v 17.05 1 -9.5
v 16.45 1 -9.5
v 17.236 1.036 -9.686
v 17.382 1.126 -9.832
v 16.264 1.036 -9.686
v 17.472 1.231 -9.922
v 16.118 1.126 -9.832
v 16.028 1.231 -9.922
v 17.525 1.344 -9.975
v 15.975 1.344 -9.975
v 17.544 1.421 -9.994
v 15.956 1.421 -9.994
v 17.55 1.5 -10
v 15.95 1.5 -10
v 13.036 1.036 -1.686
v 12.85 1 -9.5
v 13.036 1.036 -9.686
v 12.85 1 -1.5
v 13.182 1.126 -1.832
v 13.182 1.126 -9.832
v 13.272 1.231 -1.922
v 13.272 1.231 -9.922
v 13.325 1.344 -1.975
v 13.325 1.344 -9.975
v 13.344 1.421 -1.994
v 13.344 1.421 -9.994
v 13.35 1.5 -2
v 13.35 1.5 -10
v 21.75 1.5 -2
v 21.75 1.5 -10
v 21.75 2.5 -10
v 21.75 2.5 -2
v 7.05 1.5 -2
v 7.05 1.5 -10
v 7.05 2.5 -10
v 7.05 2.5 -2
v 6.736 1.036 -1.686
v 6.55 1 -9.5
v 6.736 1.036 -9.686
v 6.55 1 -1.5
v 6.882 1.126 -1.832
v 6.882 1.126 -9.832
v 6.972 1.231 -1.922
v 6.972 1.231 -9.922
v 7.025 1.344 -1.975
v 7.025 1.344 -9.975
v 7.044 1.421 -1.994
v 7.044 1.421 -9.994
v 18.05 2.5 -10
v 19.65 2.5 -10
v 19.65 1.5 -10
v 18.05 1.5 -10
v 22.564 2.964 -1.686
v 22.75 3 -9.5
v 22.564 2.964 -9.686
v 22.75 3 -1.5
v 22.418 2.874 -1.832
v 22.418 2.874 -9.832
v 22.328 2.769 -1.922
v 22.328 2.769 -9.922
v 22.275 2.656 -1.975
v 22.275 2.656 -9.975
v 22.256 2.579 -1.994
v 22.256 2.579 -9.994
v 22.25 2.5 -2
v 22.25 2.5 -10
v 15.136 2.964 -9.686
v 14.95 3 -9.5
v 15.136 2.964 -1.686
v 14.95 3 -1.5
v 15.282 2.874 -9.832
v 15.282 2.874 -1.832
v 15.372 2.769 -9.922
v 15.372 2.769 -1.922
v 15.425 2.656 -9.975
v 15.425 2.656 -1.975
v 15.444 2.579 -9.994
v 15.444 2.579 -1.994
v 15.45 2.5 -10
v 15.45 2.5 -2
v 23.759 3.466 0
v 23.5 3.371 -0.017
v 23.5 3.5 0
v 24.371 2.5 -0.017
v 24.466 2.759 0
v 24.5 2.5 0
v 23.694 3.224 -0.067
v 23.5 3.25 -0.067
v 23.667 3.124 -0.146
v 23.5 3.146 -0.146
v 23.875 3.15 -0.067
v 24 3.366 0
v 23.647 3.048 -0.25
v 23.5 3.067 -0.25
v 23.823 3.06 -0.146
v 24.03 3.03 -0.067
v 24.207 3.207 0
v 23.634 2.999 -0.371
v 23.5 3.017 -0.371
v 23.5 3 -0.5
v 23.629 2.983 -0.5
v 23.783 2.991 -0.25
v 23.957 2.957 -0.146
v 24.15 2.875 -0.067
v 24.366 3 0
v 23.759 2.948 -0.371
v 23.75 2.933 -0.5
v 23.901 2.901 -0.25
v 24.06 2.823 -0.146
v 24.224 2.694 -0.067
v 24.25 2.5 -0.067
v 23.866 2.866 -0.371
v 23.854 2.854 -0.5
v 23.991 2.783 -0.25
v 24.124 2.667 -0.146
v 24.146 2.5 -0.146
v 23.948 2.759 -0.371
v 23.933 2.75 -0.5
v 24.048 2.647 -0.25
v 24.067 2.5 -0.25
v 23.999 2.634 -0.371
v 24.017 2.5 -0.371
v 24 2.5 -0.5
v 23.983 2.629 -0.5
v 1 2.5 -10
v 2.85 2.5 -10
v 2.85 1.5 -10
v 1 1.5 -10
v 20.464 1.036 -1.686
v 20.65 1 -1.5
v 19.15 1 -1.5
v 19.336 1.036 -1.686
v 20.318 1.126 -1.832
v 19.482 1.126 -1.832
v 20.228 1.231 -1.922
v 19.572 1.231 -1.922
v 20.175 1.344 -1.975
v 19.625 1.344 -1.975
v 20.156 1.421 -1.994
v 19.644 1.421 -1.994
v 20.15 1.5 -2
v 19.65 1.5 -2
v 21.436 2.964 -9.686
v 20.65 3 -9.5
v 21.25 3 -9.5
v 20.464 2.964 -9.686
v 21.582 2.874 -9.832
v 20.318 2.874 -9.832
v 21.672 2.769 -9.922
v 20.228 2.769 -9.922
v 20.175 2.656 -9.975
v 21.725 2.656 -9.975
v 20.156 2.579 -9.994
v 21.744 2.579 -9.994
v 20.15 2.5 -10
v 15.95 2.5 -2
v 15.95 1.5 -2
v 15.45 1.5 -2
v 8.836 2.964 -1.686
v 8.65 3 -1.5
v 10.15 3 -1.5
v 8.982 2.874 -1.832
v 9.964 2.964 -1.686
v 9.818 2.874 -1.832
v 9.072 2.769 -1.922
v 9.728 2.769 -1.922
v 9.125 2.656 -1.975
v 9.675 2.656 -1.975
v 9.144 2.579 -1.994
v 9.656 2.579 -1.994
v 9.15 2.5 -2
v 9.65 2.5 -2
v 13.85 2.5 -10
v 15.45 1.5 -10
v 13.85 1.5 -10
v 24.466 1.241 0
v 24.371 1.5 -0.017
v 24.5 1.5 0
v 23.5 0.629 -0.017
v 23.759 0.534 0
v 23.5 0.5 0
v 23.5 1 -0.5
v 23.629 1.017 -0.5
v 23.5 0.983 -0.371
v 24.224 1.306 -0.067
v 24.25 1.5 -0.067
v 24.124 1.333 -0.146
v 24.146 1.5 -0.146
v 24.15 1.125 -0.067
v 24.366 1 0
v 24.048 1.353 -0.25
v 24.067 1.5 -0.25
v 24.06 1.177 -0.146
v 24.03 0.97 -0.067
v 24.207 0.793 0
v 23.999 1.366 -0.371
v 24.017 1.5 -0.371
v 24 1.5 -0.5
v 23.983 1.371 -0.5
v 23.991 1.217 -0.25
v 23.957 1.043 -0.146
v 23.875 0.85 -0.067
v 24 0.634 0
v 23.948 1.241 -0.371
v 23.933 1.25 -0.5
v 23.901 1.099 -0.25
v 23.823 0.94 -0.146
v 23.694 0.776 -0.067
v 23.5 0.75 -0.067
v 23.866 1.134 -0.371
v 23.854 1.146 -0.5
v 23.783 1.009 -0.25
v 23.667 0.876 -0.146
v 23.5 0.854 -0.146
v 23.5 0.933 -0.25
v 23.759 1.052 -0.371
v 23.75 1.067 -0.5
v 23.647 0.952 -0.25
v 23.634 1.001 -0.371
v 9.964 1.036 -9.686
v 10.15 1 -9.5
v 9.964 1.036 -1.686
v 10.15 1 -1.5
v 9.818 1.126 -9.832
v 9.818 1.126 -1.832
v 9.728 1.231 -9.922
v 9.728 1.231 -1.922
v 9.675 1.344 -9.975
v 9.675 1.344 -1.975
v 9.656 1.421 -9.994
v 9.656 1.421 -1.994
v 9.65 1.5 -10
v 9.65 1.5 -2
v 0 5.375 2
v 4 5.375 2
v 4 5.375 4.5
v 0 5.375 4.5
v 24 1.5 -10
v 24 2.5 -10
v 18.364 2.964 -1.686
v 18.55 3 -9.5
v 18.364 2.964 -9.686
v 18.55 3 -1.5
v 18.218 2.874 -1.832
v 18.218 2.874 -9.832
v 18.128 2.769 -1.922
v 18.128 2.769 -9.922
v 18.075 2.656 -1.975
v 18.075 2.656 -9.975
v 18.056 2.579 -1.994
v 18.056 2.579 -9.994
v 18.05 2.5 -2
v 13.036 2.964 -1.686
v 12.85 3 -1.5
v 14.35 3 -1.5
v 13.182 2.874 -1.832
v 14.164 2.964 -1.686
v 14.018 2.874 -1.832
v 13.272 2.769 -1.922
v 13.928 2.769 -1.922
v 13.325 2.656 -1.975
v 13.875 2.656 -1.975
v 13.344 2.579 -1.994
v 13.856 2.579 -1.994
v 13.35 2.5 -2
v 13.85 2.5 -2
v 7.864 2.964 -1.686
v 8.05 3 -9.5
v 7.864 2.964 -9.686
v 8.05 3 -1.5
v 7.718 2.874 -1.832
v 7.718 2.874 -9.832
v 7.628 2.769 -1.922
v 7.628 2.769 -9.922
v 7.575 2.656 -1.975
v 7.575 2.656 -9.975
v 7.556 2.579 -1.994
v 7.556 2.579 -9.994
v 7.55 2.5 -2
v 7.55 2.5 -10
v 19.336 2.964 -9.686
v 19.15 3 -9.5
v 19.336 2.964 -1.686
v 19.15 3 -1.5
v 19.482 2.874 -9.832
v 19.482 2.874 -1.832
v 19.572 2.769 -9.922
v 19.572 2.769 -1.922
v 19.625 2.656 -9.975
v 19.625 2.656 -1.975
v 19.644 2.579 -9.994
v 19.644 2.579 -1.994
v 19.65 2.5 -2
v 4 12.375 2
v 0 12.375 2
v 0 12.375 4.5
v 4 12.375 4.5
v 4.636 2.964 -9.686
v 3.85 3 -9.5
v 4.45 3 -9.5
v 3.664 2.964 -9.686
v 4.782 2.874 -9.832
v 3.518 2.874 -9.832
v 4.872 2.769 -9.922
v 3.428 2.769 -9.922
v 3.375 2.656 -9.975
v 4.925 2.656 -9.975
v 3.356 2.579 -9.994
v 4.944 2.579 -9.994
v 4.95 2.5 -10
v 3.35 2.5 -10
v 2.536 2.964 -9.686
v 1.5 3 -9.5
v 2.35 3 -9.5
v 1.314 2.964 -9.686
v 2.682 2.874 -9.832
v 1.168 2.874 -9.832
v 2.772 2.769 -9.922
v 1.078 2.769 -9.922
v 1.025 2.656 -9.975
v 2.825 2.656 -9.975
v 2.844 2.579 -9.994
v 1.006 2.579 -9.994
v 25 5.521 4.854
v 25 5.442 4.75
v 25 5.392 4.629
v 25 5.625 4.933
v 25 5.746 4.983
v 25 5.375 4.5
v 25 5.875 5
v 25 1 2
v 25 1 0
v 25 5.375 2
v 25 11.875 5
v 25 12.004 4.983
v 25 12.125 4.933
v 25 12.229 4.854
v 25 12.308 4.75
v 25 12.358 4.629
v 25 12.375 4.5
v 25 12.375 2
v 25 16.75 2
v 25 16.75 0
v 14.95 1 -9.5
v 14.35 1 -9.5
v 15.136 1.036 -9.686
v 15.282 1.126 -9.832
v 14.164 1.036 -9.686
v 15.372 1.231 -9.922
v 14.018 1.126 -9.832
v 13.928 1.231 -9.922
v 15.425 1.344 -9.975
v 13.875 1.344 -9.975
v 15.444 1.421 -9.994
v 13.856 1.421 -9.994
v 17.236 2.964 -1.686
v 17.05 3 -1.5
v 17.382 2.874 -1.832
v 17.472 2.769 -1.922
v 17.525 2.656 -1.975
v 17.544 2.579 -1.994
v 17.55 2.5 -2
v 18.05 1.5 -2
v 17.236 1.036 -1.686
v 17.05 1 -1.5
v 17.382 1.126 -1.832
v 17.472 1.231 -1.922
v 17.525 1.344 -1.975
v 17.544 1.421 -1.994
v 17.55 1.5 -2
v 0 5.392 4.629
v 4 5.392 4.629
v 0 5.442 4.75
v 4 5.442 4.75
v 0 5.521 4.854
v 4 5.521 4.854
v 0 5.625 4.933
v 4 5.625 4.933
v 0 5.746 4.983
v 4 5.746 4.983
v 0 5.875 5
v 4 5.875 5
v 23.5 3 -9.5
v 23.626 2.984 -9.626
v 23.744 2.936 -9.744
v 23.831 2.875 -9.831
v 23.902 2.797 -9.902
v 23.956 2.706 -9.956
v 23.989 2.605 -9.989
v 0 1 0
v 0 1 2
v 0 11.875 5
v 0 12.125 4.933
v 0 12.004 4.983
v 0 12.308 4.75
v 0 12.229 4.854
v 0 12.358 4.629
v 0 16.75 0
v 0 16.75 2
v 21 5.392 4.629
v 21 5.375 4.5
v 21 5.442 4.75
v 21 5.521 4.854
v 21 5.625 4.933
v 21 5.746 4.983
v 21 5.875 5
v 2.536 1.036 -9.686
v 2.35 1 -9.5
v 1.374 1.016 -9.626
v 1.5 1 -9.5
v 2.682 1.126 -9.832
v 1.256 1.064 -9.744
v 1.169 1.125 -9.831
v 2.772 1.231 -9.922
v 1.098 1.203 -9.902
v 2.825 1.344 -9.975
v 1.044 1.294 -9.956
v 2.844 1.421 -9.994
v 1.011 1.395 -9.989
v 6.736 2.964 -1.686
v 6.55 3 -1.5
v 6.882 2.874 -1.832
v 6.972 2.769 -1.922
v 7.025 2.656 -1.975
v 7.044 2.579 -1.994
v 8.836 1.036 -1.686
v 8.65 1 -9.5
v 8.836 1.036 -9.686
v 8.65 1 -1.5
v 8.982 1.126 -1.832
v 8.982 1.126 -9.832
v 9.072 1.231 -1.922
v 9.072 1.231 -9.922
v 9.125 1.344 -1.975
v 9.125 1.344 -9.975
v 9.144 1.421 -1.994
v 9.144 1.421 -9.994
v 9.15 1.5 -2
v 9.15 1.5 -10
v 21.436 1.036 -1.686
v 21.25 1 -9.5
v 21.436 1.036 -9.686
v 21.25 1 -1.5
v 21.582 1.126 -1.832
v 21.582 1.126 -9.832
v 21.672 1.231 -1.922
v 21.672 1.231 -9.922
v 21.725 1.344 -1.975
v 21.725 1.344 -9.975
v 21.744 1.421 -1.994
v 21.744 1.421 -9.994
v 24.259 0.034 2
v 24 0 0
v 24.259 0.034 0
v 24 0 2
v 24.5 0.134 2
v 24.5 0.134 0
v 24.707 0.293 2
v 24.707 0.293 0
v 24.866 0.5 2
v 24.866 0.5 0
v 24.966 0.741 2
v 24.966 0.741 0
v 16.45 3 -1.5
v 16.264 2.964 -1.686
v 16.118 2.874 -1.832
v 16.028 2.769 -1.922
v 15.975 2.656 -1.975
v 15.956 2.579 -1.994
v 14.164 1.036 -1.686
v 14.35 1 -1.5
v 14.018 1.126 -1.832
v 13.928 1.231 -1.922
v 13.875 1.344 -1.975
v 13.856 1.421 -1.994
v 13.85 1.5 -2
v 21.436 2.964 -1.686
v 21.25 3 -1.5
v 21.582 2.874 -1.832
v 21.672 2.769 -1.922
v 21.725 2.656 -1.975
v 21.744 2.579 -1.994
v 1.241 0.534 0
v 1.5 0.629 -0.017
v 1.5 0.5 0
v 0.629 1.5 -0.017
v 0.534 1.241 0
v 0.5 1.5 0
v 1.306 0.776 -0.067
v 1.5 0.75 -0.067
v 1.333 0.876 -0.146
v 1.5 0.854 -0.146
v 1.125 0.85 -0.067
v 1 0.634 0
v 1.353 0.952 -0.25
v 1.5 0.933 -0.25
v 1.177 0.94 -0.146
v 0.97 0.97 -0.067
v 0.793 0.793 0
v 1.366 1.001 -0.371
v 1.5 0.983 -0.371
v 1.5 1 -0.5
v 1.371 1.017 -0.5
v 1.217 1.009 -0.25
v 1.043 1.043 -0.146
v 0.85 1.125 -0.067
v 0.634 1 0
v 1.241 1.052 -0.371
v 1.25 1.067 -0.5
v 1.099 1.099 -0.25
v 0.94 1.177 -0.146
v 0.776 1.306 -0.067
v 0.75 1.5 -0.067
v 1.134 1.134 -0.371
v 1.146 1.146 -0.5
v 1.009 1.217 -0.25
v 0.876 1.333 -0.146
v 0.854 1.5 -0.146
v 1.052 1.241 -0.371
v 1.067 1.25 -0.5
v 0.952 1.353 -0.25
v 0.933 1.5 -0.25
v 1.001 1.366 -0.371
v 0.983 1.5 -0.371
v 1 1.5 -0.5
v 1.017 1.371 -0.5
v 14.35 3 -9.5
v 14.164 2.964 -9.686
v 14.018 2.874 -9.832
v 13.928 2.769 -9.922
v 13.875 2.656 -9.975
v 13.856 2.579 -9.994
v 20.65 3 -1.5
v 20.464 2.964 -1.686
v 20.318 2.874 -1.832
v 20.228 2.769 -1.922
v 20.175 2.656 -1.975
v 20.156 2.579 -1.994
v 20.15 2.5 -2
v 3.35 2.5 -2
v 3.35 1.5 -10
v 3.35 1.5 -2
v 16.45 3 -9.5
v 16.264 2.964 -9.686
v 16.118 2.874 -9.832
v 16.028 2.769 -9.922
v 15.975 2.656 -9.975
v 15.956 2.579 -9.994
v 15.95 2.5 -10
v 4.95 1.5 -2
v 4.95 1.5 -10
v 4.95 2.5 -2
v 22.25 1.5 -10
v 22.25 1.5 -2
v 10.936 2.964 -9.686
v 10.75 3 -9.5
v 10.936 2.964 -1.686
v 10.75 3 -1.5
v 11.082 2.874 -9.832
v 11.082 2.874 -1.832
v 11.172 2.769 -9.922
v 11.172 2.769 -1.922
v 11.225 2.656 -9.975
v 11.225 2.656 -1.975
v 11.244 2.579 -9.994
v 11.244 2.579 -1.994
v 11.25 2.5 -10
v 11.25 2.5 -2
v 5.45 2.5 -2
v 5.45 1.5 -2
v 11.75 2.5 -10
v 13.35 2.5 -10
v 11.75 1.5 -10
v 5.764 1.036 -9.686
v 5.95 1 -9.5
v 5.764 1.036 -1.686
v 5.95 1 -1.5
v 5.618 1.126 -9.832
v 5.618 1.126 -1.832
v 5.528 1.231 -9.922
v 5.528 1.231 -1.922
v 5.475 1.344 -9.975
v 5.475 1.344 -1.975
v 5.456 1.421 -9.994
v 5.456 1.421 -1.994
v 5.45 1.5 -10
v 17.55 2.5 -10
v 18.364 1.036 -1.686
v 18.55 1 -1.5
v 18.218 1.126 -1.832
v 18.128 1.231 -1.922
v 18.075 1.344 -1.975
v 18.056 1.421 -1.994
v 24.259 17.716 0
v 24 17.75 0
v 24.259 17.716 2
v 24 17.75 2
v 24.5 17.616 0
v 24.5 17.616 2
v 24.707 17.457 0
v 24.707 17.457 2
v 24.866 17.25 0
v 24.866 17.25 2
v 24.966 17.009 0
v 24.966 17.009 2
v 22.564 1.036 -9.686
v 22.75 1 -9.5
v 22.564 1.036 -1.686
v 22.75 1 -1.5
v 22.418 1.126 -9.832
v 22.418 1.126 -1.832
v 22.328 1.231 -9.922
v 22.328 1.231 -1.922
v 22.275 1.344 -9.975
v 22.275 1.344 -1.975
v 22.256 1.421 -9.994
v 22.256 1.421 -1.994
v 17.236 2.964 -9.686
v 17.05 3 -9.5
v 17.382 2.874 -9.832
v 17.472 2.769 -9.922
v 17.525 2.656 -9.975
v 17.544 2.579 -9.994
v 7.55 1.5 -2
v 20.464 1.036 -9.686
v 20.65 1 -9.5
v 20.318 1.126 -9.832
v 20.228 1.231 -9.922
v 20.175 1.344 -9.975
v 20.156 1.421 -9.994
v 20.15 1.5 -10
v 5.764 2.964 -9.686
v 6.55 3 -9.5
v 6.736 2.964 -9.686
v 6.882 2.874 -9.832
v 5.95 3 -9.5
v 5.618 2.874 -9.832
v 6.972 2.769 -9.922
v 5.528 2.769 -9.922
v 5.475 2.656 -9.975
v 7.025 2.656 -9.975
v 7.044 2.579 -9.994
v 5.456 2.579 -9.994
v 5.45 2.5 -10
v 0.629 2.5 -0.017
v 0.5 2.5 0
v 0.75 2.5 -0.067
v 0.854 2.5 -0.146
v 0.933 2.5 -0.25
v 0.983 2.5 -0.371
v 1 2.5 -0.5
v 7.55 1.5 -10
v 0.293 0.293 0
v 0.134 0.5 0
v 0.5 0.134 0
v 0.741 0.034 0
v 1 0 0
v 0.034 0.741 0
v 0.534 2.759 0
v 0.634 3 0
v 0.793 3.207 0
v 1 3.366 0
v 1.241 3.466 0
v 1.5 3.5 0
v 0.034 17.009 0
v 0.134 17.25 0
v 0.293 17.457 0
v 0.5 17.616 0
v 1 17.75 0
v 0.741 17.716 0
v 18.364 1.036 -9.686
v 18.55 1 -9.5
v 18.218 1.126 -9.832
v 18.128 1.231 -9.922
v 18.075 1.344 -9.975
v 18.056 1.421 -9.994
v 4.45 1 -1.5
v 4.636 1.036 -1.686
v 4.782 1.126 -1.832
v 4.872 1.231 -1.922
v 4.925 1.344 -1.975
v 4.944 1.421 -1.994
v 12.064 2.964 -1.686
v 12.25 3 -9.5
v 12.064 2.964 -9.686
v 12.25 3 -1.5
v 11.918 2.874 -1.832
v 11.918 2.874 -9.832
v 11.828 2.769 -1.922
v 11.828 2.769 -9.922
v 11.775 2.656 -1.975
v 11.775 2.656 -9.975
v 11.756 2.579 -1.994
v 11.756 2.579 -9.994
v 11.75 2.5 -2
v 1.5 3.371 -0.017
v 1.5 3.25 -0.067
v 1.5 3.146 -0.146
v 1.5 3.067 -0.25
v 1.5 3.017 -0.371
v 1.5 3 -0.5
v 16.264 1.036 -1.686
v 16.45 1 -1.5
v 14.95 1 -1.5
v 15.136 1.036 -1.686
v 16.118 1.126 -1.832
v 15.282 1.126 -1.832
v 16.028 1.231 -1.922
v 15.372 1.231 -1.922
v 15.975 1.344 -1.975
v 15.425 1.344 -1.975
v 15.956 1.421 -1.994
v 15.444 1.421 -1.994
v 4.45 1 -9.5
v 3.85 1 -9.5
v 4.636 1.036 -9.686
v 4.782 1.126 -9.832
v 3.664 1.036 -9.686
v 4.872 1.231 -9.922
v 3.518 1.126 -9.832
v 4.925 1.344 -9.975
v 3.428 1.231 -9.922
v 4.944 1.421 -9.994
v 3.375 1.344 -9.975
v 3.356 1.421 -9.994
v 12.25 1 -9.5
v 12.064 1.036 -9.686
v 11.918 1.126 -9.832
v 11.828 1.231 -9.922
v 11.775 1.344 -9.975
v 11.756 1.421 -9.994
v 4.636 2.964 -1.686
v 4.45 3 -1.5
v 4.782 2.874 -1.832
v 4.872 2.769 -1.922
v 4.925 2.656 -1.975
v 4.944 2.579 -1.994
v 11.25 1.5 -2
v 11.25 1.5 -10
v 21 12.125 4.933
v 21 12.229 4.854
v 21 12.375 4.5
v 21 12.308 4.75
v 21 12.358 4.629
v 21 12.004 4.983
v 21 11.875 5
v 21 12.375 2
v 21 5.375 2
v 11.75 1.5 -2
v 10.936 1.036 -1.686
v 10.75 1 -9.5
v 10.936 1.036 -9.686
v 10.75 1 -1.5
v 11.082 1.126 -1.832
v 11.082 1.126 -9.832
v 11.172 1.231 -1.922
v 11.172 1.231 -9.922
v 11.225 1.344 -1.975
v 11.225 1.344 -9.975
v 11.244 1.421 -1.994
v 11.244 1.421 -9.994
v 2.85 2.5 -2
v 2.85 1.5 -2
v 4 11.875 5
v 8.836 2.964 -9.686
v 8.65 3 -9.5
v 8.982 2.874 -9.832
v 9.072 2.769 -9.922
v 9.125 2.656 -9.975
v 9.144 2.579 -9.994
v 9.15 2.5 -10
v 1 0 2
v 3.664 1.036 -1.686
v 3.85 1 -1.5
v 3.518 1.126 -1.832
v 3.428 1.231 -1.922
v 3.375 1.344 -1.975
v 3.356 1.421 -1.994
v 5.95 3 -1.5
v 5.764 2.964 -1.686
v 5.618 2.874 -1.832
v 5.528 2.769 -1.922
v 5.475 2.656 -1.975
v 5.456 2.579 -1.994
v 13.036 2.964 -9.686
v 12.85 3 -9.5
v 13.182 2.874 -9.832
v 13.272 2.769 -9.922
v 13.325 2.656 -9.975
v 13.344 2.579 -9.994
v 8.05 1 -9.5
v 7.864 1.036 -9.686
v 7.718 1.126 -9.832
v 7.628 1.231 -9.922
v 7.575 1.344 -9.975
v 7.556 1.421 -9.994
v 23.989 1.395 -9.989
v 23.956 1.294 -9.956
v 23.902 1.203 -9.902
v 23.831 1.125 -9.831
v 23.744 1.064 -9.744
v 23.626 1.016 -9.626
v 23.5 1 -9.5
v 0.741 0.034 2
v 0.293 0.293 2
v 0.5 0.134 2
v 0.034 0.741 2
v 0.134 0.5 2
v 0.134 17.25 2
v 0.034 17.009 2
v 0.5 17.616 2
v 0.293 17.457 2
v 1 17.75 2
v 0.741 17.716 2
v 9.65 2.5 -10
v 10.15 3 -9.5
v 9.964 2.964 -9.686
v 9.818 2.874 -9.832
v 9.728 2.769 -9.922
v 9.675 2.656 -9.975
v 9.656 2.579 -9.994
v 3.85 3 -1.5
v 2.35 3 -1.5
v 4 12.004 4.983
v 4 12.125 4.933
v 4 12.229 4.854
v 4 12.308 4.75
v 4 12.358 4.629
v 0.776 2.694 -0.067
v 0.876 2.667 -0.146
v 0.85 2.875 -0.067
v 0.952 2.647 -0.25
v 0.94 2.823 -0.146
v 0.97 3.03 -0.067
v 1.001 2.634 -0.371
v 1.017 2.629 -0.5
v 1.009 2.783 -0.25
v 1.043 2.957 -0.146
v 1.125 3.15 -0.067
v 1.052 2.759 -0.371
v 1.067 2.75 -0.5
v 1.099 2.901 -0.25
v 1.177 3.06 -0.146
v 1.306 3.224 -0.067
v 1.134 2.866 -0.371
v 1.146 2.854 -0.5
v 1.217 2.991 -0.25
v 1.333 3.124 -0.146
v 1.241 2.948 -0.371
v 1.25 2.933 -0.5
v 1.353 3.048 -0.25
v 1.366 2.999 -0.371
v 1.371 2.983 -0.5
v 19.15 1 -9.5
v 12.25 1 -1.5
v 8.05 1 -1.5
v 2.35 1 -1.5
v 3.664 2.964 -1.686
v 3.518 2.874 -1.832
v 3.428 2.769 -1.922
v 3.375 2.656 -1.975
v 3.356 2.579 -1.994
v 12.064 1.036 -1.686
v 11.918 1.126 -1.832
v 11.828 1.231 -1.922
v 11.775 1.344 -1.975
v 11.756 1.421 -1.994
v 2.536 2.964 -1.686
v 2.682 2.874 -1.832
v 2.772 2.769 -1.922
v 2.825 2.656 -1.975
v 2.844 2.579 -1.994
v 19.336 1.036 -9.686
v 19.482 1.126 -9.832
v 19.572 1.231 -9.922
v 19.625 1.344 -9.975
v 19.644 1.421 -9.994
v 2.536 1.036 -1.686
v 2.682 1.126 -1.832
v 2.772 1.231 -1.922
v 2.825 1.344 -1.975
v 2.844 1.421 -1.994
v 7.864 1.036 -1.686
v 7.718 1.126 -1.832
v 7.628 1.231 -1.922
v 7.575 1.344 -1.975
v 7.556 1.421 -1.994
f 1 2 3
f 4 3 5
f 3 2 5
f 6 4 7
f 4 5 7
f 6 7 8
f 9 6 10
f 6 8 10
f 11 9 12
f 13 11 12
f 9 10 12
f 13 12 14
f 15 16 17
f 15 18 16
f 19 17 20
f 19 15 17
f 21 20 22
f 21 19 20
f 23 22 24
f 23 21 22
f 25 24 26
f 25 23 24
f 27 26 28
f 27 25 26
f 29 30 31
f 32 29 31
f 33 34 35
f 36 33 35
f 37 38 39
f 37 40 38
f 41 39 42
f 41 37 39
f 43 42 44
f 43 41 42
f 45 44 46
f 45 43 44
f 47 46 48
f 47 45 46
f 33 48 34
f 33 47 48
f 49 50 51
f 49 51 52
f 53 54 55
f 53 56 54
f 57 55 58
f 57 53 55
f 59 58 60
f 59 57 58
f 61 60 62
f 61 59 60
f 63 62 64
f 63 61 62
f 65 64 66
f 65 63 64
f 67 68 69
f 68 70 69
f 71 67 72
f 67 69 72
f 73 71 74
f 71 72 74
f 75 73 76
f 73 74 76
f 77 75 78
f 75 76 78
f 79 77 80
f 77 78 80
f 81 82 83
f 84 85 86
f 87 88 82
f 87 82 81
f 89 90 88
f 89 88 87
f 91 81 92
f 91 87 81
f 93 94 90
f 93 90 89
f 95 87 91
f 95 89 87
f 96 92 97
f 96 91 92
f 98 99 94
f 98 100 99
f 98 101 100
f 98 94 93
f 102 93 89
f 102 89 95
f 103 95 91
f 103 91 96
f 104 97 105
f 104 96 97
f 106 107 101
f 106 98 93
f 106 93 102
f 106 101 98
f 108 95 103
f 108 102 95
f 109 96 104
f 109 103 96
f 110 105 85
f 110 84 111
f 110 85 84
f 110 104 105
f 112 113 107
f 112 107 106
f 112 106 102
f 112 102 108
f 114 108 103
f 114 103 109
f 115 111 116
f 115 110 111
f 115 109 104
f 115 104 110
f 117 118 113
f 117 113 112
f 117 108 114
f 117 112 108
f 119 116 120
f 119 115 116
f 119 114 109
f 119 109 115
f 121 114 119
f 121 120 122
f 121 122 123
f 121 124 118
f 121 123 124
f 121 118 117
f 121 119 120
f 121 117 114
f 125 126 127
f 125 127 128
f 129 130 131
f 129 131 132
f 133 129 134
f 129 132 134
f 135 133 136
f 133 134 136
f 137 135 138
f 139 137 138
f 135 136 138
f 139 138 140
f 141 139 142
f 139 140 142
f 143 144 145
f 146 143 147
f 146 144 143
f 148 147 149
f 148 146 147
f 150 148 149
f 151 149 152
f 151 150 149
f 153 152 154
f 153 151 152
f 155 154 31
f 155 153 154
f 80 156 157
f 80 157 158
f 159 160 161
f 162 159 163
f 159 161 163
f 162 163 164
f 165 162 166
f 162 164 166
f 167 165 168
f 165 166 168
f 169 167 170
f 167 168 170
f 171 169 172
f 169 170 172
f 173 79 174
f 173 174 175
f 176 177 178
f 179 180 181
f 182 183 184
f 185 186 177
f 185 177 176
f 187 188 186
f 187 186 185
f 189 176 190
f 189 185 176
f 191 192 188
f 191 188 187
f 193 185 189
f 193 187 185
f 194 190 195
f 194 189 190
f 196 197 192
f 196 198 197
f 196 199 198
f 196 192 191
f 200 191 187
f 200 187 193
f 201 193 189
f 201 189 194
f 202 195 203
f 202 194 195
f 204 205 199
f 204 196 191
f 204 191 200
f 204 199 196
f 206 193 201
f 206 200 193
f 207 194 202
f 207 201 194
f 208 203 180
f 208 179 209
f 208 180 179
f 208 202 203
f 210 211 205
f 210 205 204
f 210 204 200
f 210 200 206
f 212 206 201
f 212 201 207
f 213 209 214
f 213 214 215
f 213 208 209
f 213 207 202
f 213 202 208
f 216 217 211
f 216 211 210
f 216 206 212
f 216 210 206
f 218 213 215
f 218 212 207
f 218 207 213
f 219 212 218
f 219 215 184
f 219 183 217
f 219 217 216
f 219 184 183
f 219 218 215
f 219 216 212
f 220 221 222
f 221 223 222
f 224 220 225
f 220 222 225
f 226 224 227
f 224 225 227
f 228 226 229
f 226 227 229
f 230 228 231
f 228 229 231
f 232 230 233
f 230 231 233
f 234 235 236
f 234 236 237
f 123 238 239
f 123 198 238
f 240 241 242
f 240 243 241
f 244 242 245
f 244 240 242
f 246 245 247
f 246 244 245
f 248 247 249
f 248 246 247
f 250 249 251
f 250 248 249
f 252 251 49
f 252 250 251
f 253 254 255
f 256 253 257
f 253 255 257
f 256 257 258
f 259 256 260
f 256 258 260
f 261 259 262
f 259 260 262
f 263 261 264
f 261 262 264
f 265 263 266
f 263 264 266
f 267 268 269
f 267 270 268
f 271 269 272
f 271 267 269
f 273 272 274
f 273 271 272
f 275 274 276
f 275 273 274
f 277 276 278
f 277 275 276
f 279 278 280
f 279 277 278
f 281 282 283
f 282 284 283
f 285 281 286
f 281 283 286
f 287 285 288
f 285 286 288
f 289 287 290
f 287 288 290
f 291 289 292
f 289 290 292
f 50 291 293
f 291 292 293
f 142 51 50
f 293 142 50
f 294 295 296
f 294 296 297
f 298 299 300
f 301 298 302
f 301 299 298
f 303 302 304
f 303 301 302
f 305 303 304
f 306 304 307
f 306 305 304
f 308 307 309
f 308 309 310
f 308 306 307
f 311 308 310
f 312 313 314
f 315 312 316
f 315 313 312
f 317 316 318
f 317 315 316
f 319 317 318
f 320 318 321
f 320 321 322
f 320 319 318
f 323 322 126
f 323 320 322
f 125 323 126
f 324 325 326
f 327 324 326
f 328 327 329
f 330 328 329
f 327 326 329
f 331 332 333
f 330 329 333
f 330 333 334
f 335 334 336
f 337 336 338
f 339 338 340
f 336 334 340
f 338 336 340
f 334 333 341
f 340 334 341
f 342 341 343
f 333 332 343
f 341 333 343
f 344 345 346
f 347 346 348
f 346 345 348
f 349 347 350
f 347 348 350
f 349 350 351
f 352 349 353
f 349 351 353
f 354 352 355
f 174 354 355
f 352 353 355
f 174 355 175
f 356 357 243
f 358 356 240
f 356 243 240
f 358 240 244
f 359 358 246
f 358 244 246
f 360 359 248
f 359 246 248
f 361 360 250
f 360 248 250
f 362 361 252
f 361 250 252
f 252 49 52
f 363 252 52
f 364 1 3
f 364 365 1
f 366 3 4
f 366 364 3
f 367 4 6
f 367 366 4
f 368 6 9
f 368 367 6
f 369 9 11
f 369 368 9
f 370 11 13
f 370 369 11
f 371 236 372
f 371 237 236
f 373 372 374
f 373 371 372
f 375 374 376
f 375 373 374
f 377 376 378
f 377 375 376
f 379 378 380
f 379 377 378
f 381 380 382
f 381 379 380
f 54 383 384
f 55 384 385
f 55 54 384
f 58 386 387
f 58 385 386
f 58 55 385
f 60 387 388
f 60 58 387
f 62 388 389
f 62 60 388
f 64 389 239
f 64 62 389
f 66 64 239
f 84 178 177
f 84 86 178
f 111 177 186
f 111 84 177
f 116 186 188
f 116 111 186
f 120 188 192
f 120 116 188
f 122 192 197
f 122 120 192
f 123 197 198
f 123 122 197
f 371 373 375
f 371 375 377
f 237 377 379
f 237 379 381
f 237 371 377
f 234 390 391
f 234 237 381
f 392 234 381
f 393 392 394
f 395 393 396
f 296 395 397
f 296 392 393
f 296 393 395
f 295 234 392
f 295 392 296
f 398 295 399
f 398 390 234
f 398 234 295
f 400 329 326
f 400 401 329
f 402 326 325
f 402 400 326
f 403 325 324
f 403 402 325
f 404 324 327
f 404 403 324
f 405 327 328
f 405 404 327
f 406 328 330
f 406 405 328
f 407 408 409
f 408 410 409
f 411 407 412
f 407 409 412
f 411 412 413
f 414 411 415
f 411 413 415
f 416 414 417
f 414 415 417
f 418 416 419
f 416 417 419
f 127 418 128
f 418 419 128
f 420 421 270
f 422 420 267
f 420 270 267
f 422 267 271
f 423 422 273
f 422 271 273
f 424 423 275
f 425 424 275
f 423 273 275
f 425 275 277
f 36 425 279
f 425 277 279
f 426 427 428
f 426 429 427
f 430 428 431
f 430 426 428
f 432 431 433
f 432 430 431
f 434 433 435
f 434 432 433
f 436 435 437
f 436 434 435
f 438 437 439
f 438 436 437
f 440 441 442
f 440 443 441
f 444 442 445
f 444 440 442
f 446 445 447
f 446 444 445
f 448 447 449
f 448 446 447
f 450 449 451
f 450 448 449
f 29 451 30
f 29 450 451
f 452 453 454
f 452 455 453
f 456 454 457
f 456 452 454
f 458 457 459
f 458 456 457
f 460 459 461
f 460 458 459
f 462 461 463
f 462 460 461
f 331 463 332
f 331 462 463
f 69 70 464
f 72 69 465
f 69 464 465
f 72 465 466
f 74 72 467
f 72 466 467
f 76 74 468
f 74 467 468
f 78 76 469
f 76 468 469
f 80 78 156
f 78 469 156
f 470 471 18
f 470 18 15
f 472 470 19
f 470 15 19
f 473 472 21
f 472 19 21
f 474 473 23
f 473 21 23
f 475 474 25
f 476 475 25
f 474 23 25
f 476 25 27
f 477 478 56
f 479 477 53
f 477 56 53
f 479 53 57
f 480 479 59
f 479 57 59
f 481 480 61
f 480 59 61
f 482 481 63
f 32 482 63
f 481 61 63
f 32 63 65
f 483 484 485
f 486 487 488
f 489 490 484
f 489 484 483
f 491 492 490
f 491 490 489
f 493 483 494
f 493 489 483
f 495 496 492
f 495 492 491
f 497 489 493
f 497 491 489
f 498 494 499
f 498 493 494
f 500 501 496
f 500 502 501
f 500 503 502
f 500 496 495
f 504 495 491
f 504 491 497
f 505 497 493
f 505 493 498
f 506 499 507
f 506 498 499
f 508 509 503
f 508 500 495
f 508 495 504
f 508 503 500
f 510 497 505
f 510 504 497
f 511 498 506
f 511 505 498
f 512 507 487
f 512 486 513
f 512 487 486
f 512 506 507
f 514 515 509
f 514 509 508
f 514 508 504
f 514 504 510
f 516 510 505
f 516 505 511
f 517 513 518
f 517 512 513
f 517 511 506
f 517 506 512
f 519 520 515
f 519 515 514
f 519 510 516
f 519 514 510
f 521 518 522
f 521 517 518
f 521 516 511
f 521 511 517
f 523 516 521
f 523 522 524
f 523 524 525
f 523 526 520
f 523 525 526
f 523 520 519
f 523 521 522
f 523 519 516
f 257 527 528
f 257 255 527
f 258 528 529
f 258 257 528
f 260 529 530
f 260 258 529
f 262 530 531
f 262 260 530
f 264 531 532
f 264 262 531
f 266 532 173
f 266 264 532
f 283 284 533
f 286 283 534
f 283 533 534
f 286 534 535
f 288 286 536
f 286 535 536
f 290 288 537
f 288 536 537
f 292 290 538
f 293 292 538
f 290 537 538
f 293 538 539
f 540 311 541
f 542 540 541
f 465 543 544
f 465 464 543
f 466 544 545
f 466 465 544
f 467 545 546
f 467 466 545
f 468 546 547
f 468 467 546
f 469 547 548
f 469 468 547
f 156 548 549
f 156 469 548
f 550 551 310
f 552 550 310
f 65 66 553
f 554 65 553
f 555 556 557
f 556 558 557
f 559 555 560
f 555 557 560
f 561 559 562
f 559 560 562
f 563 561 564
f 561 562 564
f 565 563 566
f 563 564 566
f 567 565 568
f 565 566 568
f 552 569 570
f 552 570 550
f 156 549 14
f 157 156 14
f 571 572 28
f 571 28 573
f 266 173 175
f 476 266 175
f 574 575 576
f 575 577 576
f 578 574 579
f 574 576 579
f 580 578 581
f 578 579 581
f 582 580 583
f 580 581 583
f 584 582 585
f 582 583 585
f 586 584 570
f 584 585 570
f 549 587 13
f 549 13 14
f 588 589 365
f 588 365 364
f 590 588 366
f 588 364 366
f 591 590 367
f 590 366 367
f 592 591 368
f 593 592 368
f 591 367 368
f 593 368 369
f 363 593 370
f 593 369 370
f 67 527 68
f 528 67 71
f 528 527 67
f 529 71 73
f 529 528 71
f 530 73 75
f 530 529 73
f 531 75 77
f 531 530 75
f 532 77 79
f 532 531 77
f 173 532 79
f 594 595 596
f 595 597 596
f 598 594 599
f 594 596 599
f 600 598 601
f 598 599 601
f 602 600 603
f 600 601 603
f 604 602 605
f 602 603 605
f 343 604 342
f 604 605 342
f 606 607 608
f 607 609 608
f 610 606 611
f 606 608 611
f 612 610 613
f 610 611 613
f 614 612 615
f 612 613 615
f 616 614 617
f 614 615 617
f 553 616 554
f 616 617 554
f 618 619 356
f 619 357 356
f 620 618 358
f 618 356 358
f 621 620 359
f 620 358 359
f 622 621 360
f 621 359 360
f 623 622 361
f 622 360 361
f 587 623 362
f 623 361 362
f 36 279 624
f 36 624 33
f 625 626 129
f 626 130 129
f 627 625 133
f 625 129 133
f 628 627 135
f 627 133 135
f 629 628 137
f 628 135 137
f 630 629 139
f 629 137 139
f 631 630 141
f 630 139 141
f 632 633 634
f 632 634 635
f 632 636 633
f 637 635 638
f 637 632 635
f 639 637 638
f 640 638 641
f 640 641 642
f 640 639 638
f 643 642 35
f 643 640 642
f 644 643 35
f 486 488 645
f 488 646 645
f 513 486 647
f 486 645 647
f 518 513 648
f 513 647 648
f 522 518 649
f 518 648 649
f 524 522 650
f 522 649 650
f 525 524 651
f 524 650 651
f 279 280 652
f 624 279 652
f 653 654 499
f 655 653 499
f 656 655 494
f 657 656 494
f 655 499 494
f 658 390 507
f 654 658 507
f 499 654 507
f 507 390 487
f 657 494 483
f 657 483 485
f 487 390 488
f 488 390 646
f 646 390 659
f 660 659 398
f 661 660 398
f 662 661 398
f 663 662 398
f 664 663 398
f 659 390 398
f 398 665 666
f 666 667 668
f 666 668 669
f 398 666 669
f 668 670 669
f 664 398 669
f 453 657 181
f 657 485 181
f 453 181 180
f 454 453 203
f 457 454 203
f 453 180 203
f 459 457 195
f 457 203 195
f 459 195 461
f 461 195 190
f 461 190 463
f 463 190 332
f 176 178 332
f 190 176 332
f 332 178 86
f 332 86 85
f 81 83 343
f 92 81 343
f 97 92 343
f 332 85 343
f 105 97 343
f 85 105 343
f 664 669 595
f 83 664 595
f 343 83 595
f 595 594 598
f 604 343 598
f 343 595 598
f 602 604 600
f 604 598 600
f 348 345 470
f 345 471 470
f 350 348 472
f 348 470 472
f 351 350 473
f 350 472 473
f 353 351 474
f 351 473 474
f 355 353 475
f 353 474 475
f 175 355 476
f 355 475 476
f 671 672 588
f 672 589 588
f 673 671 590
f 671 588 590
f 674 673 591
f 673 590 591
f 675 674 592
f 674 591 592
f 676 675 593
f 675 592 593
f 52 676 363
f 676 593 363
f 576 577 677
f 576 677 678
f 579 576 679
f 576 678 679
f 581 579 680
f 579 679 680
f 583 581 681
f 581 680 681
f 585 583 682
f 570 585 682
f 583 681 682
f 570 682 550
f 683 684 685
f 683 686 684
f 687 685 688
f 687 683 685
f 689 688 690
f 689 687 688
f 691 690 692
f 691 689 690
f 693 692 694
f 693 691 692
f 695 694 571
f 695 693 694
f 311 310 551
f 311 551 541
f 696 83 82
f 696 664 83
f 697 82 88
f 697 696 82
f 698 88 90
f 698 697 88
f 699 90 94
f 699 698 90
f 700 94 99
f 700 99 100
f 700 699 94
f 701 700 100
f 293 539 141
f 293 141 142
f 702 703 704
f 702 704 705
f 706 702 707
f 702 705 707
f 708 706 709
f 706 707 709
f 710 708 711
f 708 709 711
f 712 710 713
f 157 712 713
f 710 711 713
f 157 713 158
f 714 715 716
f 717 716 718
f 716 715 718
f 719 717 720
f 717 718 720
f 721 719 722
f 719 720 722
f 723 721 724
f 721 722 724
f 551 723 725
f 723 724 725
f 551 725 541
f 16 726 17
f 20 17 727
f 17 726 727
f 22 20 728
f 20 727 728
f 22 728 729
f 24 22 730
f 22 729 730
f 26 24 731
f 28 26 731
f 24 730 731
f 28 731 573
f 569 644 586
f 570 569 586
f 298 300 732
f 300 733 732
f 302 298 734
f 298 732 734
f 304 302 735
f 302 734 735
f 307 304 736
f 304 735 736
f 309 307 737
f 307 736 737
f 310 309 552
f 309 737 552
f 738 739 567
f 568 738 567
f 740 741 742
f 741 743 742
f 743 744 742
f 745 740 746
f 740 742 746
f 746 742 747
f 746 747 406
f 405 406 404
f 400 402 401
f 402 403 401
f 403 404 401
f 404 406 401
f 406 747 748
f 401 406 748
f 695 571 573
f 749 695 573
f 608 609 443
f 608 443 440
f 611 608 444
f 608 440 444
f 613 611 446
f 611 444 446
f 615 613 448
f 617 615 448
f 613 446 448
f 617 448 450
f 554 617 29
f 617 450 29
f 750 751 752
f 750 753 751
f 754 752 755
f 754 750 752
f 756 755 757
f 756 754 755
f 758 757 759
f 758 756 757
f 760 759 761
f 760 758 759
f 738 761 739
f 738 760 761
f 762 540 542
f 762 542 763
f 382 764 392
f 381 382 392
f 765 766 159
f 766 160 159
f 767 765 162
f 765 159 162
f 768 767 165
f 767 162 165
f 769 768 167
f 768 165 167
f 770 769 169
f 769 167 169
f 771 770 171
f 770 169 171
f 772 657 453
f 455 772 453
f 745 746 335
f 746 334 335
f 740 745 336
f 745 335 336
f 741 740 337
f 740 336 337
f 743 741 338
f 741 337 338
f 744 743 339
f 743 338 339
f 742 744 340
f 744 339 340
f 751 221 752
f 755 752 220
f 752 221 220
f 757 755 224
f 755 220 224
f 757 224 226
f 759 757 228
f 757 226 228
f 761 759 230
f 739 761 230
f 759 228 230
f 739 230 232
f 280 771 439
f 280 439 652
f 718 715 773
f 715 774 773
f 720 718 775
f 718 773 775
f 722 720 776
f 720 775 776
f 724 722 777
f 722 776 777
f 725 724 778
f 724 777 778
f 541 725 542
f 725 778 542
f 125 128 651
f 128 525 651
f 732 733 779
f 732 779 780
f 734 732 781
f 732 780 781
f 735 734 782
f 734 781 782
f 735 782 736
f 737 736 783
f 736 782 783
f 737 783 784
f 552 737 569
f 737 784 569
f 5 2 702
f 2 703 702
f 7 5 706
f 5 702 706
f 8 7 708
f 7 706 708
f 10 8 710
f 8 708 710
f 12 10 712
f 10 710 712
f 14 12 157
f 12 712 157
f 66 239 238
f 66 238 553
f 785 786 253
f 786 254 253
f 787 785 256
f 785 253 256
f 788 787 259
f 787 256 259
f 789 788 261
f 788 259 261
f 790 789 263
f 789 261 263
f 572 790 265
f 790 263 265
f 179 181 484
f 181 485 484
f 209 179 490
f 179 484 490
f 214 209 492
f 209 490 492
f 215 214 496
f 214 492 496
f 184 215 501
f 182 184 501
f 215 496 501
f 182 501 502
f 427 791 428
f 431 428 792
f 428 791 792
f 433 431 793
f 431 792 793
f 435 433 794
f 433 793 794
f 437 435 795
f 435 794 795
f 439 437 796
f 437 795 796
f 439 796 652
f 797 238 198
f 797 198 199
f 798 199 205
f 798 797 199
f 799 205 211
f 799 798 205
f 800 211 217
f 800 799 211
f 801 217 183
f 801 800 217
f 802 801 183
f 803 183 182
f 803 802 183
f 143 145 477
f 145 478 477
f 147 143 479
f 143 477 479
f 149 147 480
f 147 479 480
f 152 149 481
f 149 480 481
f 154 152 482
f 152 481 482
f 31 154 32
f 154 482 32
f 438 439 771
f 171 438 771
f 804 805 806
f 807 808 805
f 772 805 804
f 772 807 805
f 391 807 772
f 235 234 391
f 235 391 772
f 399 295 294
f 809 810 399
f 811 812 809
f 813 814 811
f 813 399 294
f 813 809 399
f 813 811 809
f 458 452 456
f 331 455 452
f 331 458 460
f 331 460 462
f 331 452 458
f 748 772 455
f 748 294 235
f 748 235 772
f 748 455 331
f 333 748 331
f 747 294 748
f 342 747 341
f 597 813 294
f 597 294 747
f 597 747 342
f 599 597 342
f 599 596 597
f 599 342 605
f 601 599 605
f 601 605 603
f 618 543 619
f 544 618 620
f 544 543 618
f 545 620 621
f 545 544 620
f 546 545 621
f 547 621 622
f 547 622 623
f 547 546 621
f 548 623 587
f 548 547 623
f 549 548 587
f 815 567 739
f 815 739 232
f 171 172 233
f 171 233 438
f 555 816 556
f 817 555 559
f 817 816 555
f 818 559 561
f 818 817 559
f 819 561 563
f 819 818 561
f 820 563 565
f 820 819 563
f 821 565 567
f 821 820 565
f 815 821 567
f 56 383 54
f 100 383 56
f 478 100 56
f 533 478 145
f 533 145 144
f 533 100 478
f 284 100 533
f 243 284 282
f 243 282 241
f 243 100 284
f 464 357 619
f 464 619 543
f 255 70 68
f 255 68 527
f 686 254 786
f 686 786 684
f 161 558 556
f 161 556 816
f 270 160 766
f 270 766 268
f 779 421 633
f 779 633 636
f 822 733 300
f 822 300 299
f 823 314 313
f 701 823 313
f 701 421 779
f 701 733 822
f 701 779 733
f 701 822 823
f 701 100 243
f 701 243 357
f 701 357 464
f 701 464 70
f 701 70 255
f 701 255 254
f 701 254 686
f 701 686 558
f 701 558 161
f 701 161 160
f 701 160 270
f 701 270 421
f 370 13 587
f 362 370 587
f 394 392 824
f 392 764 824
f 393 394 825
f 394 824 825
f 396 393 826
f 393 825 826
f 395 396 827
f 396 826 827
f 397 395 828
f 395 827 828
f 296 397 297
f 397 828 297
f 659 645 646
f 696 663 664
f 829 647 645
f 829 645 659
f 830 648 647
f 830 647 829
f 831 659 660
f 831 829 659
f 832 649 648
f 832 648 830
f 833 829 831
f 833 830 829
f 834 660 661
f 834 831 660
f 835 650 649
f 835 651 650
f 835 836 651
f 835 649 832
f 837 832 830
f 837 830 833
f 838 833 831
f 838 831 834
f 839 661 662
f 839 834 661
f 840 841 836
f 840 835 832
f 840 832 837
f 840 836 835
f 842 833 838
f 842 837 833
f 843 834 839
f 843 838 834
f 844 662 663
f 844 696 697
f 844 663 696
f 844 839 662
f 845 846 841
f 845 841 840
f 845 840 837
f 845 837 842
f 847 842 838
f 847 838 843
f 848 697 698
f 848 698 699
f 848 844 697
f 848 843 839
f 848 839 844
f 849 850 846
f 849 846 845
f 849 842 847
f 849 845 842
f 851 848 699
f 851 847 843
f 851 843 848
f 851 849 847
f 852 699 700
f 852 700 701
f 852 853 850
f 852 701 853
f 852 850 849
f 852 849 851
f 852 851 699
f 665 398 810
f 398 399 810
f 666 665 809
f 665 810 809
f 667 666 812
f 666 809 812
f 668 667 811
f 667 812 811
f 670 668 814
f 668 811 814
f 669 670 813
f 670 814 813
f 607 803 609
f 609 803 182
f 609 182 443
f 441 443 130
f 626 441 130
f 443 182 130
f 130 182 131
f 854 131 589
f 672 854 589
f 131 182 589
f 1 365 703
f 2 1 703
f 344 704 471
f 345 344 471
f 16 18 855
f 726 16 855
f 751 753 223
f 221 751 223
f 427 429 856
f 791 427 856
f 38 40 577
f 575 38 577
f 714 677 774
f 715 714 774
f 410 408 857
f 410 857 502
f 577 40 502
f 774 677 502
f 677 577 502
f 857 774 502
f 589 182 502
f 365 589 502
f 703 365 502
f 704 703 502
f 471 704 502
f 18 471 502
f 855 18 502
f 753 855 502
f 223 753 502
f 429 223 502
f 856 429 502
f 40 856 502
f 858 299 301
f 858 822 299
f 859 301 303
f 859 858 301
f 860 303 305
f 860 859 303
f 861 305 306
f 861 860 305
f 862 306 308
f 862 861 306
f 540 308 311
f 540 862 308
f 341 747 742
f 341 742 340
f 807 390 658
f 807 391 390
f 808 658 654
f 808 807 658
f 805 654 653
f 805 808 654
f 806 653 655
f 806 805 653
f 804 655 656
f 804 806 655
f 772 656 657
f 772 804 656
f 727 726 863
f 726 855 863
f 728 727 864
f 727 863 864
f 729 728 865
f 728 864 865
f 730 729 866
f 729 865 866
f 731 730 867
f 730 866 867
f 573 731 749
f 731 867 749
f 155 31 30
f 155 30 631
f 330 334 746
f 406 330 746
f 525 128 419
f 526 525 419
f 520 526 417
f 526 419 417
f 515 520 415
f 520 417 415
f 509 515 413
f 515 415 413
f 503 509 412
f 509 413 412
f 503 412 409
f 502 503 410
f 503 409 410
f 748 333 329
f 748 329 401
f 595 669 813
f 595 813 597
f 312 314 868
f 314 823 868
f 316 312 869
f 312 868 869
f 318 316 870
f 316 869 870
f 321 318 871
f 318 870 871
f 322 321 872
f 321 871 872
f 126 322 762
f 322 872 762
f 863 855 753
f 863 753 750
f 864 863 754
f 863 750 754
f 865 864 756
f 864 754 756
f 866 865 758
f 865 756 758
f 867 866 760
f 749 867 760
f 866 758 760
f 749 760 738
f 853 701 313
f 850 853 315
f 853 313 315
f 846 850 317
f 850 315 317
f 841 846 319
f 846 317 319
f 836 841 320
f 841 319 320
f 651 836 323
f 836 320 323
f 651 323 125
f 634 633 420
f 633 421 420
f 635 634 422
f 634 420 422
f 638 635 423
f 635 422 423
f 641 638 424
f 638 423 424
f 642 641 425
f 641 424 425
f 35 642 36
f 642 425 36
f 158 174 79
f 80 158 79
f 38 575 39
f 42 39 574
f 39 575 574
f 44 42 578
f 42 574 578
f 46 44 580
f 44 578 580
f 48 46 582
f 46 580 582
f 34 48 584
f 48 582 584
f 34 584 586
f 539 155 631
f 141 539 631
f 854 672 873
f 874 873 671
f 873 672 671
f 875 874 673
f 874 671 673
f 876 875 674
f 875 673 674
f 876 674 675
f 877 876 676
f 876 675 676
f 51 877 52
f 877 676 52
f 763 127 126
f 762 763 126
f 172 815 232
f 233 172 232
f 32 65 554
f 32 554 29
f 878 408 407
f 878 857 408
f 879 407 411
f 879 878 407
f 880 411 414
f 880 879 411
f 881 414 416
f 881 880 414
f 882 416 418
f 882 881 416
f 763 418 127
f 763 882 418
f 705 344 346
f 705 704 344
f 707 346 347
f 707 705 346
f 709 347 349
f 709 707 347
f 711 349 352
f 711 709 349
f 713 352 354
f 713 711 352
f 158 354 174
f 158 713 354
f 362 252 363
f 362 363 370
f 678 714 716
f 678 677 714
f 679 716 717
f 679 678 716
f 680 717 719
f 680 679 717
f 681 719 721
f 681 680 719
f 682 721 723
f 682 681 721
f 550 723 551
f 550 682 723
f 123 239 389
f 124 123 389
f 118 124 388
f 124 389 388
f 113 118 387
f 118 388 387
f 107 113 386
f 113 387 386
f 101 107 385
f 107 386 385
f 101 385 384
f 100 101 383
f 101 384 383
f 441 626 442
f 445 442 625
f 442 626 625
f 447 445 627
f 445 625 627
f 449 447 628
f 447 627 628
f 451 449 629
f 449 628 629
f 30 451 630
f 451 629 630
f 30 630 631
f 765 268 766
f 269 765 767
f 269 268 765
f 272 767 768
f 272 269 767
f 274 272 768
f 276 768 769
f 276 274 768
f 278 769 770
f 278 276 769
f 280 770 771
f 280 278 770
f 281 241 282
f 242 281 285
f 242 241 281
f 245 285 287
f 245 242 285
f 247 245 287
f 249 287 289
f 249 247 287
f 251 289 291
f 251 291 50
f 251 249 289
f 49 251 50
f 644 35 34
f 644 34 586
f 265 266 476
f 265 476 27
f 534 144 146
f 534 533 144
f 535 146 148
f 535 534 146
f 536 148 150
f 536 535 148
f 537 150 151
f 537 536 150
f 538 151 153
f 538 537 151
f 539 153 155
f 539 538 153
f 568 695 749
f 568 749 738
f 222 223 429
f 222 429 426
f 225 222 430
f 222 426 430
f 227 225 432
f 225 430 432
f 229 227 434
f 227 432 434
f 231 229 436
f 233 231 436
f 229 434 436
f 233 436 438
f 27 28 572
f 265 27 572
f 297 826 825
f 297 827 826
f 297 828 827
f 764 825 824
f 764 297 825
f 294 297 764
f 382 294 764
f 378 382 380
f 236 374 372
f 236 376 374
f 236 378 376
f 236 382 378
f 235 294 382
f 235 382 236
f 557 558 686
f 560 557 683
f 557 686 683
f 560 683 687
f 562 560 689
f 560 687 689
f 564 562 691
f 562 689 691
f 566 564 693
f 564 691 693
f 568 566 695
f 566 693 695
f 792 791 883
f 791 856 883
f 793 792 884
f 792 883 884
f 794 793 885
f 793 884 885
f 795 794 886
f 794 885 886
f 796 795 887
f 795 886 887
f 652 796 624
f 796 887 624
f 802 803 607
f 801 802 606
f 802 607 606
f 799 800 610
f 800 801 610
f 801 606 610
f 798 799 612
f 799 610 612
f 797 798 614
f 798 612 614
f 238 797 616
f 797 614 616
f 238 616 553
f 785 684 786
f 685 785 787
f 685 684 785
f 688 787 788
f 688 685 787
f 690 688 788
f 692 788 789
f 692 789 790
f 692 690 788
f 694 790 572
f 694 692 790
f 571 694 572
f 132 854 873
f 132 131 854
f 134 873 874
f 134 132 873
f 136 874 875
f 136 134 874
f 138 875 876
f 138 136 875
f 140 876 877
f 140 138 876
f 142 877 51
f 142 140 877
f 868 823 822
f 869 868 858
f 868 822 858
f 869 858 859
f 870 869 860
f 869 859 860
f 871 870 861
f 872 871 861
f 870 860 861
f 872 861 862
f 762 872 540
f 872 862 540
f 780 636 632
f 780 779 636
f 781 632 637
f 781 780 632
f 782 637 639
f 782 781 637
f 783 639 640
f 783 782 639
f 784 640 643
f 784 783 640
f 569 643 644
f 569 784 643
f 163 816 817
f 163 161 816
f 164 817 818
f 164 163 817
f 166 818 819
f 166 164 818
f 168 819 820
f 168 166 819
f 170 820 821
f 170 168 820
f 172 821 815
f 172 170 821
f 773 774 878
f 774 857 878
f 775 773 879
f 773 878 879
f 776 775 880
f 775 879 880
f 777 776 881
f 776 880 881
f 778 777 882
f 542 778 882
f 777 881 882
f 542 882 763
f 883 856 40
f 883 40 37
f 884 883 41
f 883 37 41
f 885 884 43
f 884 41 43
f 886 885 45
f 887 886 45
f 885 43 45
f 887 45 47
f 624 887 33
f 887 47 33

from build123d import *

# Parameters (mm, degrees)
SKETCH1_W           = 25
SKETCH1_H           = 17.75
BOSS_EXTRUDE1_DEPTH = 2
BOSS_EXTRUDE2_DEPTH = 3
SKETCH3_W           = 23
SKETCH3_H           = 2
BOSS_EXTRUDE3_DEPTH = 10
CUT_EXTRUDE1_DEPTH  = 8
FILLET1_R           = 1
FILLET2_R           = 0.5
FILLET3_R           = 0.5


with BuildPart() as part:
    # Sketch1 → Boss-Extrude1 (new body)
    with BuildSketch(Plane.XY):
        with Locations((12.5, 8.875)):
            Rectangle(SKETCH1_W, SKETCH1_H)
    extrude(amount=BOSS_EXTRUDE1_DEPTH)

    # Sketch2 → Boss-Extrude2 (add)
    with BuildSketch(Plane.XY.offset(2)):
        Polygon((0, 8.875), (0, 12.375), (4, 12.375), (4, 5.375), (0, 5.375), align=None)
        Polygon((21, 8.875), (21, 12.375), (25, 12.375), (25, 5.375), (21, 5.375), align=None)
    extrude(amount=BOSS_EXTRUDE2_DEPTH)

    # Sketch3 → Boss-Extrude3 (add)
    with BuildSketch(Plane(origin=(0, 0, 0), x_dir=(-1, 0, 0), z_dir=(0, 0, -1))):
        with Locations((-12.5, 2)):
            Rectangle(SKETCH3_W, SKETCH3_H)
    extrude(amount=BOSS_EXTRUDE3_DEPTH)

    # Sketch4 → Cut-Extrude1 (cut)
    with BuildSketch(Plane(origin=(0, 0, -10), x_dir=(-1, 0, 0), z_dir=(0, 0, -1))):
        Polygon((-19.9, 3), (-20.15, 3), (-20.15, 1), (-19.65, 1), (-19.65, 3), align=None)
        Polygon((-22, 3), (-22.25, 3), (-22.25, 1), (-21.75, 1), (-21.75, 3), align=None)
        Polygon((-17.8, 3), (-18.05, 3), (-18.05, 1), (-17.55, 1), (-17.55, 3), align=None)
        Polygon((-15.7, 3), (-15.95, 3), (-15.95, 1), (-15.45, 1), (-15.45, 3), align=None)
        Polygon((-13.6, 3), (-13.85, 3), (-13.85, 1), (-13.35, 1), (-13.35, 3), align=None)
        Polygon((-11.5, 3), (-11.75, 3), (-11.75, 1), (-11.25, 1), (-11.25, 3), align=None)
        Polygon((-9.4, 3), (-9.65, 3), (-9.65, 1), (-9.15, 1), (-9.15, 3), align=None)
        Polygon((-7.3, 3), (-7.55, 3), (-7.55, 1), (-7.05, 1), (-7.05, 3), align=None)
        Polygon((-5.2, 3), (-5.45, 3), (-5.45, 1), (-4.95, 1), (-4.95, 3), align=None)
        Polygon((-3.1, 3), (-3.35, 3), (-3.35, 1), (-2.85, 1), (-2.85, 3), align=None)
    extrude(amount=-CUT_EXTRUDE1_DEPTH, mode=Mode.SUBTRACT)

    # Fillet1
    fillet1_edges = [part.edges().sort_by_distance(p)[0] for p in [
        (0, 0, 1),
        (0, 17.75, 1),
        (25, 17.75, 1),
        (25, 0, 1),
    ]]
    fillet(fillet1_edges, radius=FILLET1_R)

    # Fillet2
    fillet2_edges = [part.edges().sort_by_distance(p)[0] for p in [
        (21.75, 3, -6),
        (22, 1, -2),
        (21.75, 1, -6),
        (22.25, 1, -6),
        (22, 3, -2),
        (22.25, 3, -6),
        (19.65, 3, -6),
        (19.9, 1, -2),
        (19.65, 1, -6),
        (20.15, 1, -6),
        (19.9, 3, -2),
        (20.15, 3, -6),
        (17.55, 3, -6),
        (17.8, 1, -2),
        (17.55, 1, -6),
        (18.05, 1, -6),
        (17.8, 3, -2),
        (18.05, 3, -6),
        (15.45, 3, -6),
        (15.7, 1, -2),
        (15.45, 1, -6),
        (15.95, 1, -6),
        (15.7, 3, -2),
        (15.95, 3, -6),
        (13.35, 3, -6),
        (13.6, 1, -2),
        (13.35, 1, -6),
        (13.85, 1, -6),
        (13.6, 3, -2),
        (13.85, 3, -6),
        (11.25, 3, -6),
        (11.5, 1, -2),
        (11.25, 1, -6),
        (11.75, 1, -6),
        (11.5, 3, -2),
        (11.75, 3, -6),
        (9.15, 3, -6),
        (9.4, 1, -2),
        (9.15, 1, -6),
        (9.65, 1, -6),
        (9.4, 3, -2),
        (9.65, 3, -6),
        (7.05, 3, -6),
        (7.3, 1, -2),
        (7.05, 1, -6),
        (7.55, 1, -6),
        (7.3, 3, -2),
        (7.55, 3, -6),
        (4.95, 3, -6),
        (5.2, 1, -2),
        (4.95, 1, -6),
        (5.45, 1, -6),
        (5.2, 3, -2),
        (5.45, 3, -6),
        (2.85, 3, -6),
        (3.1, 1, -2),
        (2.85, 1, -6),
        (3.35, 1, -6),
        (3.1, 3, -2),
        (3.35, 3, -6),
        (12.5, 1, 0),
        (24, 1, -5),
        (1, 2, 0),
        (1, 1, -5),
        (12.5, 3, 0),
        (1, 3, -5),
        (24, 2, 0),
        (24, 3, -5),
        (23.125, 1, -10),
        (1.925, 3, -10),
        (20.95, 1, -10),
        (18.85, 1, -10),
        (16.75, 1, -10),
        (14.65, 1, -10),
        (12.55, 1, -10),
        (10.45, 1, -10),
        (8.35, 1, -10),
        (6.25, 1, -10),
        (4.15, 1, -10),
        (1.925, 1, -10),
        (4.15, 3, -10),
        (6.25, 3, -10),
        (8.35, 3, -10),
        (10.45, 3, -10),
        (12.55, 3, -10),
        (14.65, 3, -10),
        (16.75, 3, -10),
        (18.85, 3, -10),
        (20.95, 3, -10),
        (23.125, 3, -10),
    ]]
    fillet(fillet2_edges, radius=FILLET2_R)

    # Fillet3
    fillet3_edges = [part.edges().sort_by_distance(p)[0] for p in [
        (2, 5.375, 5),
        (2, 12.375, 5),
        (23, 5.375, 5),
        (23, 12.375, 5),
    ]]
    fillet(fillet3_edges, radius=FILLET3_R)


solid = part.part
